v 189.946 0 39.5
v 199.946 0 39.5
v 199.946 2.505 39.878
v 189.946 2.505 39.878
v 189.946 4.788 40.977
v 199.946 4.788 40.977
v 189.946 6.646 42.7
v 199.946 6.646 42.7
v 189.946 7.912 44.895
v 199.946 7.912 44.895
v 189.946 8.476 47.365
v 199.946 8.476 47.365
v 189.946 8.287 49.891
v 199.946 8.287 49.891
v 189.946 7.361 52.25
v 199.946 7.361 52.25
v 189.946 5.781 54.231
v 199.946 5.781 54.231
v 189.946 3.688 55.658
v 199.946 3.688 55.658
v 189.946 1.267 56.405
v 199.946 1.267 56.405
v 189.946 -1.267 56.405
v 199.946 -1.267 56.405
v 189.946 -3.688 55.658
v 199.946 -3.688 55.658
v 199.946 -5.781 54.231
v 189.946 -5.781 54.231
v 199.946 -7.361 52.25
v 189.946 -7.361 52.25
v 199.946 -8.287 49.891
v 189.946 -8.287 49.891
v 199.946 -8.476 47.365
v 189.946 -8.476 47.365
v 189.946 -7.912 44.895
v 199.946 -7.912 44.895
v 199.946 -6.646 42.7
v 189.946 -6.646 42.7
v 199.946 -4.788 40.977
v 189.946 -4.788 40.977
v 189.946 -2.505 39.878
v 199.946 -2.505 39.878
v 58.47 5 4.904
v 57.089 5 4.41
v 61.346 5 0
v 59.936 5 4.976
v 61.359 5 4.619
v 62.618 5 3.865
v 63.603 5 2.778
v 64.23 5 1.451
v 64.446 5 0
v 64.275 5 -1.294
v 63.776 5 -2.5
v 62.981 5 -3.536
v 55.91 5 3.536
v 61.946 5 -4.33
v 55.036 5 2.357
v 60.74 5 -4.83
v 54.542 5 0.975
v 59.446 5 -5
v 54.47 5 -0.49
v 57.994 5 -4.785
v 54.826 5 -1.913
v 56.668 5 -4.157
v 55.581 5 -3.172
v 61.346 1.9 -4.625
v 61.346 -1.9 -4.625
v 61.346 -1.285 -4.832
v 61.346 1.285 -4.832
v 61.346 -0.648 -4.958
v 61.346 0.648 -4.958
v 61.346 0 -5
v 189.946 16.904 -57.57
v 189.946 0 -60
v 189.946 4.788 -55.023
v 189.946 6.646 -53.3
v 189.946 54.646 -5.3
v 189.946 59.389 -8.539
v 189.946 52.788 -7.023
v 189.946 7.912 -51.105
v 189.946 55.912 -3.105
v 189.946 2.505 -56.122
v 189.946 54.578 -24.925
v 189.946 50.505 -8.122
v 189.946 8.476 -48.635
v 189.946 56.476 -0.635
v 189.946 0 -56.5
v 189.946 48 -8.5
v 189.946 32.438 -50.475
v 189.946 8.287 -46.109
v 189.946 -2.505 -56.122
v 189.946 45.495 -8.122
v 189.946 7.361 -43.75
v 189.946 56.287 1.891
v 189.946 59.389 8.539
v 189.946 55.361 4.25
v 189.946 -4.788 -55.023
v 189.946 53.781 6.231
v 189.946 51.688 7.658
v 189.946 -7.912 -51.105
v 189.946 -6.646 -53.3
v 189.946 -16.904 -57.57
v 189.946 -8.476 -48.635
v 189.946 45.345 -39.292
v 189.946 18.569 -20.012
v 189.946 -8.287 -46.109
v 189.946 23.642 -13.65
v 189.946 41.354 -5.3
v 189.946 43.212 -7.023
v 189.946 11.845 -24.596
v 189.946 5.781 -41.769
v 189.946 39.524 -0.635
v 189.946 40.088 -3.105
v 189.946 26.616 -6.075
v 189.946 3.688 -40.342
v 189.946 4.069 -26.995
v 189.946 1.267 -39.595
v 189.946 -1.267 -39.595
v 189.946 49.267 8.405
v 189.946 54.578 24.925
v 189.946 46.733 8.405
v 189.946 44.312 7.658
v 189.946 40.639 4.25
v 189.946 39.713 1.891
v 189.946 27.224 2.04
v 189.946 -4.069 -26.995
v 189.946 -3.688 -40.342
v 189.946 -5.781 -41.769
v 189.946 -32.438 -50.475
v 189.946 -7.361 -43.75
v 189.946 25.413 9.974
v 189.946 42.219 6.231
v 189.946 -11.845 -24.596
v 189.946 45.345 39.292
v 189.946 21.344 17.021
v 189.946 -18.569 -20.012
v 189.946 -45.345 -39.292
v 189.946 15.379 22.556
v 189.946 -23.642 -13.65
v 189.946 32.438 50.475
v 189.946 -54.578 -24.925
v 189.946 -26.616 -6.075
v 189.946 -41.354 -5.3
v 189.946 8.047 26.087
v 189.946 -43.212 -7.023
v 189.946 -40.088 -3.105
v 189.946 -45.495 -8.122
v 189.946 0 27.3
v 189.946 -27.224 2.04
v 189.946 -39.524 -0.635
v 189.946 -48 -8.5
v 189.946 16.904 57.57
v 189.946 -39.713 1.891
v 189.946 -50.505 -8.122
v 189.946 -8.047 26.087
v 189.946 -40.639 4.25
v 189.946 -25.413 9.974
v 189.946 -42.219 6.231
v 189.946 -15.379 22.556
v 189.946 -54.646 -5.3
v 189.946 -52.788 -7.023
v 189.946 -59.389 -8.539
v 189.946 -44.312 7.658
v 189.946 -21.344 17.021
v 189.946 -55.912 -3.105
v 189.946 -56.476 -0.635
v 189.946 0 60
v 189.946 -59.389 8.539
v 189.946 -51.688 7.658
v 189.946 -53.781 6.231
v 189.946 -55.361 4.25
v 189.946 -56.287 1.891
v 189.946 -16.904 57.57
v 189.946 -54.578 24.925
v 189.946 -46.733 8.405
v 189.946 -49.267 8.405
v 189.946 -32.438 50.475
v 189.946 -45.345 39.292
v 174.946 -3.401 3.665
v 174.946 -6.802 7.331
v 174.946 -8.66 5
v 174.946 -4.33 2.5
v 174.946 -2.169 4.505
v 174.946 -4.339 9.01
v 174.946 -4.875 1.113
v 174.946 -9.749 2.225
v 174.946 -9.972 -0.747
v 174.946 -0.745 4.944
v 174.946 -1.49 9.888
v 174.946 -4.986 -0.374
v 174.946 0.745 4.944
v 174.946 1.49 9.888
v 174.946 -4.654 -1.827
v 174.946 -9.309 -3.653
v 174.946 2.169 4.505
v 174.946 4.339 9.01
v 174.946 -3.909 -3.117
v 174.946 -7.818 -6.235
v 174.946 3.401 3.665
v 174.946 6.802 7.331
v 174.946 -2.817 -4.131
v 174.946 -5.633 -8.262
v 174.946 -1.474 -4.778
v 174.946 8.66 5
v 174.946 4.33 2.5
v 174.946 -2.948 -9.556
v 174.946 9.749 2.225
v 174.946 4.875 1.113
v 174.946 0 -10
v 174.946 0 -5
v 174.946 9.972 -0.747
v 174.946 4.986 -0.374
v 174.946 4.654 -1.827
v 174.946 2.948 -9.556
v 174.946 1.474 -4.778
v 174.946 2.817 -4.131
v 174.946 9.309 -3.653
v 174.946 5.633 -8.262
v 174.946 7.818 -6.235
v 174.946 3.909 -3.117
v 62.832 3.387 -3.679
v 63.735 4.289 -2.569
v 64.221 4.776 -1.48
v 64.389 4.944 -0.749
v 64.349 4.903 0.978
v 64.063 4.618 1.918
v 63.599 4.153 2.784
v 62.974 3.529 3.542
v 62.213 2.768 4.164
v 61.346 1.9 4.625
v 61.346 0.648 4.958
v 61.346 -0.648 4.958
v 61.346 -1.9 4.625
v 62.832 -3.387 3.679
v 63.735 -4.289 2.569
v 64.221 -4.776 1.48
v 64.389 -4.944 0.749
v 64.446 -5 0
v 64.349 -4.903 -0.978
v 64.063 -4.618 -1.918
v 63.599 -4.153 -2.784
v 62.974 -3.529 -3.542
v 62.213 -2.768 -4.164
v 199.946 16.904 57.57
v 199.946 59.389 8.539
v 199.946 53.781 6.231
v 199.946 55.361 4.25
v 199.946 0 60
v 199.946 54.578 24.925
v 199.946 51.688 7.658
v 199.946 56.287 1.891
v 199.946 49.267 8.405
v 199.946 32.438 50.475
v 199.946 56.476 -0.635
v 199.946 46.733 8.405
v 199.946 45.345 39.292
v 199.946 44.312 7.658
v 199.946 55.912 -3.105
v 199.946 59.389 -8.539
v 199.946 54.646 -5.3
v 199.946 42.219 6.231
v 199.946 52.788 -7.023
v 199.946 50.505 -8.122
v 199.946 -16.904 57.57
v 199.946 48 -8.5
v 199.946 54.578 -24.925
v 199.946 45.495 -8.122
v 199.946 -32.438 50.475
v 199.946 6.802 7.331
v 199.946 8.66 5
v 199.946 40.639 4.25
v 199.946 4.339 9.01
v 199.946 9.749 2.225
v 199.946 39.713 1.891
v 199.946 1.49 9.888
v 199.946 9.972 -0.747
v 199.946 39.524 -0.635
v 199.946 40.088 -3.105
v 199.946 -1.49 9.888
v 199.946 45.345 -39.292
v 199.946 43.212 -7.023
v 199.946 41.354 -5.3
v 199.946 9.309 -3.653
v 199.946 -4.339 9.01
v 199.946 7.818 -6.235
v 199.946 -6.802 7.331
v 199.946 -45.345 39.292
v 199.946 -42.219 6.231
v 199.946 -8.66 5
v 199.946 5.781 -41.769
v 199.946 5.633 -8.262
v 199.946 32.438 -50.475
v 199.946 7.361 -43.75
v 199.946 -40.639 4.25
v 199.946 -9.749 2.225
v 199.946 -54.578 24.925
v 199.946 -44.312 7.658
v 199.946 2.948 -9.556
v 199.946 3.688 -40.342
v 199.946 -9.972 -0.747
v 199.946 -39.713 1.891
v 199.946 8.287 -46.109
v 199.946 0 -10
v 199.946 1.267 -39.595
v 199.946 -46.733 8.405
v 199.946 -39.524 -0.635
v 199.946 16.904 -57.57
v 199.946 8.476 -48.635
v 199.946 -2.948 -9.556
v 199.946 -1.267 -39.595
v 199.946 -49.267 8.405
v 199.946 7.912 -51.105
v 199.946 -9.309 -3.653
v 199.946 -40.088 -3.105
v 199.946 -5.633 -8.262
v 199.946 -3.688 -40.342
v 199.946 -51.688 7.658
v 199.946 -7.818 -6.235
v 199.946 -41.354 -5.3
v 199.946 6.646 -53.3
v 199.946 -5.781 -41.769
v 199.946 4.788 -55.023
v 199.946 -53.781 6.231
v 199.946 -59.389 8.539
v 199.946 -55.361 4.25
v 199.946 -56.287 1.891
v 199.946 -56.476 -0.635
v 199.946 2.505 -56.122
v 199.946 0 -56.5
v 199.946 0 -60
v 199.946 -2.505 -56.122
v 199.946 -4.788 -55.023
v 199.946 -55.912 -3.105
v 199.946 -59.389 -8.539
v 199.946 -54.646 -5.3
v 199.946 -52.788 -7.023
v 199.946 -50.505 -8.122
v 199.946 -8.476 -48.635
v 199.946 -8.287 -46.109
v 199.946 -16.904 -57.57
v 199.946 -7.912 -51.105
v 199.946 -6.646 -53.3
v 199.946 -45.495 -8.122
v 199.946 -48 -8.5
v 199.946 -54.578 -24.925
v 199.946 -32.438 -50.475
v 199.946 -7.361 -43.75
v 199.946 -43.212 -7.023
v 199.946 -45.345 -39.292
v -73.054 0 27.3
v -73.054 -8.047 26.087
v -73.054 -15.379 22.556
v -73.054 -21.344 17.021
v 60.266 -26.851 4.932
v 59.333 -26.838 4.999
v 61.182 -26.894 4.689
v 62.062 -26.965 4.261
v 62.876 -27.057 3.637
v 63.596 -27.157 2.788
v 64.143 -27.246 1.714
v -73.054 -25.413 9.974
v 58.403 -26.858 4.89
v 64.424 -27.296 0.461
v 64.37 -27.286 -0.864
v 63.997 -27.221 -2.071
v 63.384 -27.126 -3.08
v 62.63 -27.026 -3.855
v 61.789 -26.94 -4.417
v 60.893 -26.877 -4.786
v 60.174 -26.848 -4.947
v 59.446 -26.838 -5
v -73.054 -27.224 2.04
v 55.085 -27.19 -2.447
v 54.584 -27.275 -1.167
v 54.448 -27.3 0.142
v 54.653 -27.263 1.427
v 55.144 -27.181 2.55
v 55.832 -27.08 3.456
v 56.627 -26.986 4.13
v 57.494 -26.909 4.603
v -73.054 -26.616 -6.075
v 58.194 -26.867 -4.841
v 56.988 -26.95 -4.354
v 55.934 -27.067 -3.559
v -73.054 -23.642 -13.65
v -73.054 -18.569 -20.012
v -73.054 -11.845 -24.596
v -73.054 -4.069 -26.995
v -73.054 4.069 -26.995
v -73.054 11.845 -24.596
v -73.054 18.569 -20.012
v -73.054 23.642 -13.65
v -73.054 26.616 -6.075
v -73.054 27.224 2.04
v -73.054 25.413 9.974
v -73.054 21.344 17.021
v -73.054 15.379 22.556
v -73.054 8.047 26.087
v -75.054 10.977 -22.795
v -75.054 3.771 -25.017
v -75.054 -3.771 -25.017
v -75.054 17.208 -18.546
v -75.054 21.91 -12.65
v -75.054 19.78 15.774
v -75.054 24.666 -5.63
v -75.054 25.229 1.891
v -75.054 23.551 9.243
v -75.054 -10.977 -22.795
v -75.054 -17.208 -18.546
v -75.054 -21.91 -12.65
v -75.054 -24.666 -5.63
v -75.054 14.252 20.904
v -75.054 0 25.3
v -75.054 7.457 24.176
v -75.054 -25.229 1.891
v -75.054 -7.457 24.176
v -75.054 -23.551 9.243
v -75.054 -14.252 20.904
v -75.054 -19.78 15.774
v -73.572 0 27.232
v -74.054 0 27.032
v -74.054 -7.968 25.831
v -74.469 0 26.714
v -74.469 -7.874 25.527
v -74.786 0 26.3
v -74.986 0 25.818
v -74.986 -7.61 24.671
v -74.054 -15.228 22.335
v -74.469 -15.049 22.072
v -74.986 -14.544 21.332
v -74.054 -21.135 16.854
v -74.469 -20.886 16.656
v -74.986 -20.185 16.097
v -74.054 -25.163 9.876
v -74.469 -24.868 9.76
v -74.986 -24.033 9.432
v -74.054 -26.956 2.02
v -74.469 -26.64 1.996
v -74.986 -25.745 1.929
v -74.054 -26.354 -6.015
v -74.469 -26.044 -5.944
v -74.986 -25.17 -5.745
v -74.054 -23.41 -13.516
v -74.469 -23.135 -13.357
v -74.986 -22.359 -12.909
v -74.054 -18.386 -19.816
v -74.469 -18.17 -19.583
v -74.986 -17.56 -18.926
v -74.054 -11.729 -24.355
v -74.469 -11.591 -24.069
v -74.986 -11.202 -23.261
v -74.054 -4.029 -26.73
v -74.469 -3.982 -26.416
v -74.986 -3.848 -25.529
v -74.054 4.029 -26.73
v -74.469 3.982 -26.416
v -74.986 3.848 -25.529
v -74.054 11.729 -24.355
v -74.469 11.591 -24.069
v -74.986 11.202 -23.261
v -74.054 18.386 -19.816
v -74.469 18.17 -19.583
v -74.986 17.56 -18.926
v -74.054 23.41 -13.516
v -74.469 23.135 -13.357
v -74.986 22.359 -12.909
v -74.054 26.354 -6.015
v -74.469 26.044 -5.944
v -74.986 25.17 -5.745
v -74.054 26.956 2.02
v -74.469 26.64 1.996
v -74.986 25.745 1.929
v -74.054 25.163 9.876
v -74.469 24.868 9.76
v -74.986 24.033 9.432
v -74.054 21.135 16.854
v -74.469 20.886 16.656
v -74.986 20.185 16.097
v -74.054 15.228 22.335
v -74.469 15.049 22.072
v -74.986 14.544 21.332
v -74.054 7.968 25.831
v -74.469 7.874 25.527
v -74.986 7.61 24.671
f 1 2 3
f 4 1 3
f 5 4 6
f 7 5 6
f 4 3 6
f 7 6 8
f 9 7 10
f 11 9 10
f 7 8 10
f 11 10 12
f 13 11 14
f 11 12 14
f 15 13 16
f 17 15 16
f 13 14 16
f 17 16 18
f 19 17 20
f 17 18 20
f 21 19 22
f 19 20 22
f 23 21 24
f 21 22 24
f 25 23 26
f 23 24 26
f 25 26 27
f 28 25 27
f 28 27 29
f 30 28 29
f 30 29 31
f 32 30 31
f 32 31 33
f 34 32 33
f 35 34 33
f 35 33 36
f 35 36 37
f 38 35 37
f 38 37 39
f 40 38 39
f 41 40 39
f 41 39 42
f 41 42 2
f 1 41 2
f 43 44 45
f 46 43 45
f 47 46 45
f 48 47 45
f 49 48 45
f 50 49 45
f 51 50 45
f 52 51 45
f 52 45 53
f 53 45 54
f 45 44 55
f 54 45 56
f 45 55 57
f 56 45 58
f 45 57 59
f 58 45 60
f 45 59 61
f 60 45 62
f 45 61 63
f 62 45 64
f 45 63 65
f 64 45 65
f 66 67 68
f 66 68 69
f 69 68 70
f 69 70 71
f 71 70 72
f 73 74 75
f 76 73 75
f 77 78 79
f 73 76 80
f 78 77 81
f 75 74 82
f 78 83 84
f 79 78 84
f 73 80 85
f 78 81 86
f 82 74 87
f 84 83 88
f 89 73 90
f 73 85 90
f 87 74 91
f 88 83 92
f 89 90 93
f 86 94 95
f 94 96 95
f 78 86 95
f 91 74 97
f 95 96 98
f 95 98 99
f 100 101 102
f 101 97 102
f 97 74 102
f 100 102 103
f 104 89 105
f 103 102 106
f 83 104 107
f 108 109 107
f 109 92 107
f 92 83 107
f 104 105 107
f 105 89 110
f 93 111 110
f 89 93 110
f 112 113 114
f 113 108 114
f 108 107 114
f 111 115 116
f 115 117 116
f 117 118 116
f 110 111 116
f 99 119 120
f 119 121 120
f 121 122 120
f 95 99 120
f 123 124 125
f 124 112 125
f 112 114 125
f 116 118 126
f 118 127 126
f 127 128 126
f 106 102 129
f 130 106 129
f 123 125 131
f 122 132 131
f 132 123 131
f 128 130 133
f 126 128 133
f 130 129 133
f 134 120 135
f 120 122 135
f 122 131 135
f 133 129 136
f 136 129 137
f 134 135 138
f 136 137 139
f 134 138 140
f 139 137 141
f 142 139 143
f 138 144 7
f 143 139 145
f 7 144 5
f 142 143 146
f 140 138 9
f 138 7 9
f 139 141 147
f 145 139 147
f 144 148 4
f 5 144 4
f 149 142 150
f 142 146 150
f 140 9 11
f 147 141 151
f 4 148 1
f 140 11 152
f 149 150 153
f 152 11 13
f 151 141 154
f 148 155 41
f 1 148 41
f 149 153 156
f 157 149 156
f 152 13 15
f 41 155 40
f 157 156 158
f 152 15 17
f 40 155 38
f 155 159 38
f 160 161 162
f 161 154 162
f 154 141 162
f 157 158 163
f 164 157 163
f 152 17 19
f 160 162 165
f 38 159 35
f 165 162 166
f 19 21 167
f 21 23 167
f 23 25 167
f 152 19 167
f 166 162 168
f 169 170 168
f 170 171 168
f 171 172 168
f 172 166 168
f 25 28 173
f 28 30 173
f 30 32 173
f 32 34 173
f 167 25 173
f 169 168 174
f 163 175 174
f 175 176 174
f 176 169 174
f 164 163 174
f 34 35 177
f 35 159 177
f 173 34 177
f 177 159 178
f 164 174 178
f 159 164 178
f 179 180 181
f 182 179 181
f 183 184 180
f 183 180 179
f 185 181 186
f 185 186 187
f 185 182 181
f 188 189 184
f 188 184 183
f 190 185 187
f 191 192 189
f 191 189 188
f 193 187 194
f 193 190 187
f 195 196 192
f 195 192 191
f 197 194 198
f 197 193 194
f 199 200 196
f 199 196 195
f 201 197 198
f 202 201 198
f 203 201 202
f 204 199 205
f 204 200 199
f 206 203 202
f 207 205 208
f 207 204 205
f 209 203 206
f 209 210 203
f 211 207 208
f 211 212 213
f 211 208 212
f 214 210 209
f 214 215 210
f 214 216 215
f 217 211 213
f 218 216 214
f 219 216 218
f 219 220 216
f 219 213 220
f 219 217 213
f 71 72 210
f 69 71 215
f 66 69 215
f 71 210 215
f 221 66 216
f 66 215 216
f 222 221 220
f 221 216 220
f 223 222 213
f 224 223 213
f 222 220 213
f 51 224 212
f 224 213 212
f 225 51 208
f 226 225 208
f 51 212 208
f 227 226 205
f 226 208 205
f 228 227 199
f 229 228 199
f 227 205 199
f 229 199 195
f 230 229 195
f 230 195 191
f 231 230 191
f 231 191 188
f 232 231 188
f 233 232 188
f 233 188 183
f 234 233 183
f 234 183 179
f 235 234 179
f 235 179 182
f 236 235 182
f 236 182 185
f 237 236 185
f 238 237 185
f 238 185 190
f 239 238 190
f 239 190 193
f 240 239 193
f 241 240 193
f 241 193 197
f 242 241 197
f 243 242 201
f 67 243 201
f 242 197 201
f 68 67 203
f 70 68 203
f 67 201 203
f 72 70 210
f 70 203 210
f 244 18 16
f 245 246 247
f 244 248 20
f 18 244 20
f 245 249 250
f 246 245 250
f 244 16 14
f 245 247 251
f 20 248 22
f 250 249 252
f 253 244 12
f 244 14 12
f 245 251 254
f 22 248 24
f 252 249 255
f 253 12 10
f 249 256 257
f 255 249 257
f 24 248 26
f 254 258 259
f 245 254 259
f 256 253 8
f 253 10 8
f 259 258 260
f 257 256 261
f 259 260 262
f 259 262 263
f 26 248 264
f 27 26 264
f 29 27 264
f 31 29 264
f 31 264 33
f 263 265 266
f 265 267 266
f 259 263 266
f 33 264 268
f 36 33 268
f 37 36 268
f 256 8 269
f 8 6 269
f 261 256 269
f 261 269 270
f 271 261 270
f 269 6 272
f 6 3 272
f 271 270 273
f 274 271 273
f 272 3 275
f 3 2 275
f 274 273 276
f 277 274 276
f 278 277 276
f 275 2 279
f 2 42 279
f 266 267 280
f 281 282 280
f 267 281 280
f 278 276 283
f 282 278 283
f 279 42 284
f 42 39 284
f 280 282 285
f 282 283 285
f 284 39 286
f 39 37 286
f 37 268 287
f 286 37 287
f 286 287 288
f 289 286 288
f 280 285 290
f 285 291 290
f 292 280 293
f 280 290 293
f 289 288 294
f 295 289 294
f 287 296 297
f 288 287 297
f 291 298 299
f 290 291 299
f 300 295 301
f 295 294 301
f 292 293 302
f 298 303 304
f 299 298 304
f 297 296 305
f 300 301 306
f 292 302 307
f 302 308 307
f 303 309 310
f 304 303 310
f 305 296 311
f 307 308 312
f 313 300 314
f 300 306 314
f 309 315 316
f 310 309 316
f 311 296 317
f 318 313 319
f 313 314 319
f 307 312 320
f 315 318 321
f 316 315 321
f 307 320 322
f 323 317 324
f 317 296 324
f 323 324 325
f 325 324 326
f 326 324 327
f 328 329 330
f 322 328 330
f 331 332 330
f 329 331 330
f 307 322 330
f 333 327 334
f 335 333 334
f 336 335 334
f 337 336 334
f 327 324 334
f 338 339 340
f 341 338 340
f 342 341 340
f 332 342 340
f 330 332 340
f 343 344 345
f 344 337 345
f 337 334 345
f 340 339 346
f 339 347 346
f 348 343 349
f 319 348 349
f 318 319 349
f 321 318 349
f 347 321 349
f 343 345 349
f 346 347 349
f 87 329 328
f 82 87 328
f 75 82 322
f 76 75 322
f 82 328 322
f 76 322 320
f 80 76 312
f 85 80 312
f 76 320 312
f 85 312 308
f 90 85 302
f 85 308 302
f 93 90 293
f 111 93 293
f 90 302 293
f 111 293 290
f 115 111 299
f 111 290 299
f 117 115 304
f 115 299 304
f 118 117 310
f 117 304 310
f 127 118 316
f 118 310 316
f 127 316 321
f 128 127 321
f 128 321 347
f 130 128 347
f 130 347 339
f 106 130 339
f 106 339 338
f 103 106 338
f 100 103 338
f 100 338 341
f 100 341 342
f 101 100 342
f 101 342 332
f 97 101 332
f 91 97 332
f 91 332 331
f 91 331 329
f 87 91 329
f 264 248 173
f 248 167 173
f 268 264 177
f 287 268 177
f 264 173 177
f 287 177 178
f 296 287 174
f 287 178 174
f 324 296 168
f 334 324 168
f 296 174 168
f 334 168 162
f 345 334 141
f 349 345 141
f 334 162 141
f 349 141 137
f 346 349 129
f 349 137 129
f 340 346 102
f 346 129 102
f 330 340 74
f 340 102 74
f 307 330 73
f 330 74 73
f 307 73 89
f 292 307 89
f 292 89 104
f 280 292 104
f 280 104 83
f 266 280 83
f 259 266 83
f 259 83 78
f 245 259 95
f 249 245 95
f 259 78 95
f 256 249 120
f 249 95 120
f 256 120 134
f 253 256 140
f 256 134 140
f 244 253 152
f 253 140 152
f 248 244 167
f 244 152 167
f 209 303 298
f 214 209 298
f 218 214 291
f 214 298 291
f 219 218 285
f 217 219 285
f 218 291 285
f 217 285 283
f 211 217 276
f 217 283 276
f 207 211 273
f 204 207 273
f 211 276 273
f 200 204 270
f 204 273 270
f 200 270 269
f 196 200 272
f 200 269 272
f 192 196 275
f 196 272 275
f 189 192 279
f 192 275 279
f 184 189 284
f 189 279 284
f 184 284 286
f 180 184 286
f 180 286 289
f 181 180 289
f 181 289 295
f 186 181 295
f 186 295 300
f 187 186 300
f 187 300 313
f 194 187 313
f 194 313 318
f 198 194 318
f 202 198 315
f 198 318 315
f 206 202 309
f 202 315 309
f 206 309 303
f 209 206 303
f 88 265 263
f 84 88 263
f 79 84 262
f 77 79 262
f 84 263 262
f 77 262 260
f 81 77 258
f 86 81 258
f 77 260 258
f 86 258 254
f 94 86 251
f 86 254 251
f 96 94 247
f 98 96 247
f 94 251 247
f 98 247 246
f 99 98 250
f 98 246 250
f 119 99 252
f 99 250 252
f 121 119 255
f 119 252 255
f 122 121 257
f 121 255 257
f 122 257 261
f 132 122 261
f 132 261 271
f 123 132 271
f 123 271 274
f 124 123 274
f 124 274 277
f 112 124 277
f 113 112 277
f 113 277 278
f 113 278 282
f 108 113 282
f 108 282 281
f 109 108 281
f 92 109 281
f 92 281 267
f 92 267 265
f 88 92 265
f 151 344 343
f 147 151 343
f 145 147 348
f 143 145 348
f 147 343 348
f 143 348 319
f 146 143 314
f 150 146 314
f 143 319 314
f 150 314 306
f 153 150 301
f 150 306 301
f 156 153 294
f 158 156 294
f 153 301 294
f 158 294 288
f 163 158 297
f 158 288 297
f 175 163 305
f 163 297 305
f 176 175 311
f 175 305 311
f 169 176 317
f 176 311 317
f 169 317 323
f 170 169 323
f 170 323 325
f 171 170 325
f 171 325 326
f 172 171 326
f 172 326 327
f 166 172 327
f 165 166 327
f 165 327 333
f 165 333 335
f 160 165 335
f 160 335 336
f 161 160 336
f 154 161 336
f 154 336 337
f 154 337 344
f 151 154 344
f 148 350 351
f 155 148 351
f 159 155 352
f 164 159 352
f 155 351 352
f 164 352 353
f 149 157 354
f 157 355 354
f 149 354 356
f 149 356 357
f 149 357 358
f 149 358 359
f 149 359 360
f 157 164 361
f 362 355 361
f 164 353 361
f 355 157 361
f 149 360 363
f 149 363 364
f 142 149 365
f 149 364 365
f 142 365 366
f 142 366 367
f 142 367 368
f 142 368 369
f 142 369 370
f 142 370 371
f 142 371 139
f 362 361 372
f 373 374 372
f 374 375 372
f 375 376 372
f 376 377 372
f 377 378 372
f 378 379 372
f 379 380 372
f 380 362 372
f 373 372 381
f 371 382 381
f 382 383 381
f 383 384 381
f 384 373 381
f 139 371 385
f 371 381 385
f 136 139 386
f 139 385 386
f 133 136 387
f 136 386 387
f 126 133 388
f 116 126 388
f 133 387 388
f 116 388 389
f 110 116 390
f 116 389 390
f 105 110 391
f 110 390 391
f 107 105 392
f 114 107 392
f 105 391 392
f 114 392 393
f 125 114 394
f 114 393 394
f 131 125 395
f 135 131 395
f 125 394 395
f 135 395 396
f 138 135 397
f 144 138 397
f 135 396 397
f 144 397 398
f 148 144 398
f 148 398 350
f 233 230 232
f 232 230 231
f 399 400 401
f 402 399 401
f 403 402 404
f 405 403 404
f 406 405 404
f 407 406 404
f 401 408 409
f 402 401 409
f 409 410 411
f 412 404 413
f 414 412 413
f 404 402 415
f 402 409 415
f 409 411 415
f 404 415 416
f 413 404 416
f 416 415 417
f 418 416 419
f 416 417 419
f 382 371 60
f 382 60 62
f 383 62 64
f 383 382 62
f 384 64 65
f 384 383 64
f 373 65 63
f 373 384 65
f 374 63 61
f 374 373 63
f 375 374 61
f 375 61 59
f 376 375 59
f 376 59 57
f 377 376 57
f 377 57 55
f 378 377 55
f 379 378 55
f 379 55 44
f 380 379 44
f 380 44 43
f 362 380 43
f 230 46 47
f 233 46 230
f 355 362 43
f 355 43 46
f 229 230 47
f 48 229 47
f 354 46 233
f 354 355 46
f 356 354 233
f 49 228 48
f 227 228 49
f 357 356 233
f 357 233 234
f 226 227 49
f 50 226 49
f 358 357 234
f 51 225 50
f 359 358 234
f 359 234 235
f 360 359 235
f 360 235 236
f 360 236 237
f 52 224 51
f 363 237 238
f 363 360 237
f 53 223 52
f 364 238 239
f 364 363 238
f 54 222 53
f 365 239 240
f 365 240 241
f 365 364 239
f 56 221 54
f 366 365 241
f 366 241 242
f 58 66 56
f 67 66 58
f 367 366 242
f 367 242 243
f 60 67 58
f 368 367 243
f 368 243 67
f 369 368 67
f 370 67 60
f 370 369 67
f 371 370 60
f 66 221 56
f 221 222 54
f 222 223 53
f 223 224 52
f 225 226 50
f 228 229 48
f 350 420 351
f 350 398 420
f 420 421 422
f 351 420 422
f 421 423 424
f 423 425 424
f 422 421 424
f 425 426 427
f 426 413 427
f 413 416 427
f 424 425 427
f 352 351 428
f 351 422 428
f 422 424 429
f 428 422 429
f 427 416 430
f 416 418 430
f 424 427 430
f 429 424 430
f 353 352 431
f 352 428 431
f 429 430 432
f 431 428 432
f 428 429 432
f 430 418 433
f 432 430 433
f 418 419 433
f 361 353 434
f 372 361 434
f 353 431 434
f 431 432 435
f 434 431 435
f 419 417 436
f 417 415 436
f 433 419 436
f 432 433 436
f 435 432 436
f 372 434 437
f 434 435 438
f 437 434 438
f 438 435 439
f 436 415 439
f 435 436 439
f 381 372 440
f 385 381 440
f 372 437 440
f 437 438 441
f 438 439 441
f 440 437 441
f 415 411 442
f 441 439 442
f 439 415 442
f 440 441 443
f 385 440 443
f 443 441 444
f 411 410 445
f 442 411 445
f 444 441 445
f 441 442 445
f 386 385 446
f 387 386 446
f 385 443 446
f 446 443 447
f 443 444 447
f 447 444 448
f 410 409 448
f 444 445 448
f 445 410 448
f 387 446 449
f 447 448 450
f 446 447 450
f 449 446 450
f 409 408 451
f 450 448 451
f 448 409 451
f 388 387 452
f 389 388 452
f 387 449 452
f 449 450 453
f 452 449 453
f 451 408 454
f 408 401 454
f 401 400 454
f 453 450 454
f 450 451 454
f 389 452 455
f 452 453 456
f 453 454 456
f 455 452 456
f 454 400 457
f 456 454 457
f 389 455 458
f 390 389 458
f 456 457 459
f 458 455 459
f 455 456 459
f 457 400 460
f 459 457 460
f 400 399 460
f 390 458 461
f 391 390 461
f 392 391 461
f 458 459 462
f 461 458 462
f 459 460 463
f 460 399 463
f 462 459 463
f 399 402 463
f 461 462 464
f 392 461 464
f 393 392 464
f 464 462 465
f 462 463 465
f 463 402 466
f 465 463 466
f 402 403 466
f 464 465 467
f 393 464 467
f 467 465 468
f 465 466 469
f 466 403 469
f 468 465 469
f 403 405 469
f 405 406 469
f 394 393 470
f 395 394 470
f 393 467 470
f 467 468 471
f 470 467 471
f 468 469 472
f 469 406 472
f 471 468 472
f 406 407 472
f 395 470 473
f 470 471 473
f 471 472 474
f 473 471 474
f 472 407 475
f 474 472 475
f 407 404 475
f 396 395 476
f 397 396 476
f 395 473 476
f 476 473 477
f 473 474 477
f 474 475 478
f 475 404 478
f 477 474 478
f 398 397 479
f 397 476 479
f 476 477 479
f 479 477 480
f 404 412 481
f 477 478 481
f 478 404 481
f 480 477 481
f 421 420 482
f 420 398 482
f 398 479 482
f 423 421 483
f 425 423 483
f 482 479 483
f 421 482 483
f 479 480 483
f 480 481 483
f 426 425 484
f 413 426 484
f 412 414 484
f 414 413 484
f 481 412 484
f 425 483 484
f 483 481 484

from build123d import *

# Parameters (mm, degrees)
ESQUISSE2_R                  = 8.5
ESQUISSE2_R_2                = 10
ENL_V_MAT_EXTRU_1_DEPTH      = 25
ESQUISSE3_R                  = 5
ENL_V_MAT_EXTRU_2_DEPTH      = 113.6
CONG_1_R                     = 2
ENL_V_MAT_EXTRU_3_DEPTH      = 5
ENL_V_MAT_EXTRU_3_DEPTH_BACK = 105.5
ESQUISSE4_R                  = 5


with BuildPart() as part:
    # Esquisse1 → Révolution1 (revolve)
    with BuildSketch(Plane.XY, mode=Mode.PRIVATE) as r_volution1_sk:
        Polygon((-75.054401386, 0), (199.945598614, 0), (199.945598614, 60), (189.945598614, 60), (189.945598614, 27.3), (-75.054401386, 27.3), align=None)
    revolve(r_volution1_sk.sketch.rotate(Axis((-75.054401386, 0, 0), (1, 0, 0)), 90), axis=Axis((-75.054401386, 0, 0), (1, 0, 0)))

    # Esquisse2 → Enlèv. mat.-Extru.1 (cut)
    with BuildSketch(Plane(origin=(199.945598614, 0, 0), x_dir=(0, 0, -1), z_dir=(1, 0, 0))):
        with Locations((0, 48)):
            Circle(ESQUISSE2_R)
        with Locations((0, -48)):
            Circle(ESQUISSE2_R)
        with Locations((-48, 0)):
            Circle(ESQUISSE2_R)
        with Locations((48, 0)):
            Circle(ESQUISSE2_R)
        Circle(ESQUISSE2_R_2)
    extrude(amount=-ENL_V_MAT_EXTRU_1_DEPTH, mode=Mode.SUBTRACT)

    # Esquisse3 → Enlèv. mat.-Extru.2 (cut)
    with BuildSketch(Plane(origin=(174.945598614, 0, 0), x_dir=(0, 0, -1), z_dir=(1, 0, 0))):
        Circle(ESQUISSE3_R)
    extrude(amount=-ENL_V_MAT_EXTRU_2_DEPTH, mode=Mode.SUBTRACT)

    # Congé1
    cong_1_edges = [part.edges().sort_by_distance(p)[0] for p in [
        (-75.054401386, 0, -27.3),
    ]]
    fillet(cong_1_edges, radius=CONG_1_R)

    # Esquisse4 → Enlèv. mat.-Extru.3 (cut, two sides: drawn at the far end of the back side and taken through both)
    with BuildSketch(Plane(origin=(0, 0, 0), x_dir=(1, 0, 0), z_dir=(0, 1, 0)).offset(-ENL_V_MAT_EXTRU_3_DEPTH_BACK)):
        with Locations(Location((59.445598614, 0, 0), (0, 0, 90))):
            Circle(ESQUISSE4_R)
    extrude(amount=ENL_V_MAT_EXTRU_3_DEPTH + ENL_V_MAT_EXTRU_3_DEPTH_BACK, mode=Mode.SUBTRACT)


solid = part.part
